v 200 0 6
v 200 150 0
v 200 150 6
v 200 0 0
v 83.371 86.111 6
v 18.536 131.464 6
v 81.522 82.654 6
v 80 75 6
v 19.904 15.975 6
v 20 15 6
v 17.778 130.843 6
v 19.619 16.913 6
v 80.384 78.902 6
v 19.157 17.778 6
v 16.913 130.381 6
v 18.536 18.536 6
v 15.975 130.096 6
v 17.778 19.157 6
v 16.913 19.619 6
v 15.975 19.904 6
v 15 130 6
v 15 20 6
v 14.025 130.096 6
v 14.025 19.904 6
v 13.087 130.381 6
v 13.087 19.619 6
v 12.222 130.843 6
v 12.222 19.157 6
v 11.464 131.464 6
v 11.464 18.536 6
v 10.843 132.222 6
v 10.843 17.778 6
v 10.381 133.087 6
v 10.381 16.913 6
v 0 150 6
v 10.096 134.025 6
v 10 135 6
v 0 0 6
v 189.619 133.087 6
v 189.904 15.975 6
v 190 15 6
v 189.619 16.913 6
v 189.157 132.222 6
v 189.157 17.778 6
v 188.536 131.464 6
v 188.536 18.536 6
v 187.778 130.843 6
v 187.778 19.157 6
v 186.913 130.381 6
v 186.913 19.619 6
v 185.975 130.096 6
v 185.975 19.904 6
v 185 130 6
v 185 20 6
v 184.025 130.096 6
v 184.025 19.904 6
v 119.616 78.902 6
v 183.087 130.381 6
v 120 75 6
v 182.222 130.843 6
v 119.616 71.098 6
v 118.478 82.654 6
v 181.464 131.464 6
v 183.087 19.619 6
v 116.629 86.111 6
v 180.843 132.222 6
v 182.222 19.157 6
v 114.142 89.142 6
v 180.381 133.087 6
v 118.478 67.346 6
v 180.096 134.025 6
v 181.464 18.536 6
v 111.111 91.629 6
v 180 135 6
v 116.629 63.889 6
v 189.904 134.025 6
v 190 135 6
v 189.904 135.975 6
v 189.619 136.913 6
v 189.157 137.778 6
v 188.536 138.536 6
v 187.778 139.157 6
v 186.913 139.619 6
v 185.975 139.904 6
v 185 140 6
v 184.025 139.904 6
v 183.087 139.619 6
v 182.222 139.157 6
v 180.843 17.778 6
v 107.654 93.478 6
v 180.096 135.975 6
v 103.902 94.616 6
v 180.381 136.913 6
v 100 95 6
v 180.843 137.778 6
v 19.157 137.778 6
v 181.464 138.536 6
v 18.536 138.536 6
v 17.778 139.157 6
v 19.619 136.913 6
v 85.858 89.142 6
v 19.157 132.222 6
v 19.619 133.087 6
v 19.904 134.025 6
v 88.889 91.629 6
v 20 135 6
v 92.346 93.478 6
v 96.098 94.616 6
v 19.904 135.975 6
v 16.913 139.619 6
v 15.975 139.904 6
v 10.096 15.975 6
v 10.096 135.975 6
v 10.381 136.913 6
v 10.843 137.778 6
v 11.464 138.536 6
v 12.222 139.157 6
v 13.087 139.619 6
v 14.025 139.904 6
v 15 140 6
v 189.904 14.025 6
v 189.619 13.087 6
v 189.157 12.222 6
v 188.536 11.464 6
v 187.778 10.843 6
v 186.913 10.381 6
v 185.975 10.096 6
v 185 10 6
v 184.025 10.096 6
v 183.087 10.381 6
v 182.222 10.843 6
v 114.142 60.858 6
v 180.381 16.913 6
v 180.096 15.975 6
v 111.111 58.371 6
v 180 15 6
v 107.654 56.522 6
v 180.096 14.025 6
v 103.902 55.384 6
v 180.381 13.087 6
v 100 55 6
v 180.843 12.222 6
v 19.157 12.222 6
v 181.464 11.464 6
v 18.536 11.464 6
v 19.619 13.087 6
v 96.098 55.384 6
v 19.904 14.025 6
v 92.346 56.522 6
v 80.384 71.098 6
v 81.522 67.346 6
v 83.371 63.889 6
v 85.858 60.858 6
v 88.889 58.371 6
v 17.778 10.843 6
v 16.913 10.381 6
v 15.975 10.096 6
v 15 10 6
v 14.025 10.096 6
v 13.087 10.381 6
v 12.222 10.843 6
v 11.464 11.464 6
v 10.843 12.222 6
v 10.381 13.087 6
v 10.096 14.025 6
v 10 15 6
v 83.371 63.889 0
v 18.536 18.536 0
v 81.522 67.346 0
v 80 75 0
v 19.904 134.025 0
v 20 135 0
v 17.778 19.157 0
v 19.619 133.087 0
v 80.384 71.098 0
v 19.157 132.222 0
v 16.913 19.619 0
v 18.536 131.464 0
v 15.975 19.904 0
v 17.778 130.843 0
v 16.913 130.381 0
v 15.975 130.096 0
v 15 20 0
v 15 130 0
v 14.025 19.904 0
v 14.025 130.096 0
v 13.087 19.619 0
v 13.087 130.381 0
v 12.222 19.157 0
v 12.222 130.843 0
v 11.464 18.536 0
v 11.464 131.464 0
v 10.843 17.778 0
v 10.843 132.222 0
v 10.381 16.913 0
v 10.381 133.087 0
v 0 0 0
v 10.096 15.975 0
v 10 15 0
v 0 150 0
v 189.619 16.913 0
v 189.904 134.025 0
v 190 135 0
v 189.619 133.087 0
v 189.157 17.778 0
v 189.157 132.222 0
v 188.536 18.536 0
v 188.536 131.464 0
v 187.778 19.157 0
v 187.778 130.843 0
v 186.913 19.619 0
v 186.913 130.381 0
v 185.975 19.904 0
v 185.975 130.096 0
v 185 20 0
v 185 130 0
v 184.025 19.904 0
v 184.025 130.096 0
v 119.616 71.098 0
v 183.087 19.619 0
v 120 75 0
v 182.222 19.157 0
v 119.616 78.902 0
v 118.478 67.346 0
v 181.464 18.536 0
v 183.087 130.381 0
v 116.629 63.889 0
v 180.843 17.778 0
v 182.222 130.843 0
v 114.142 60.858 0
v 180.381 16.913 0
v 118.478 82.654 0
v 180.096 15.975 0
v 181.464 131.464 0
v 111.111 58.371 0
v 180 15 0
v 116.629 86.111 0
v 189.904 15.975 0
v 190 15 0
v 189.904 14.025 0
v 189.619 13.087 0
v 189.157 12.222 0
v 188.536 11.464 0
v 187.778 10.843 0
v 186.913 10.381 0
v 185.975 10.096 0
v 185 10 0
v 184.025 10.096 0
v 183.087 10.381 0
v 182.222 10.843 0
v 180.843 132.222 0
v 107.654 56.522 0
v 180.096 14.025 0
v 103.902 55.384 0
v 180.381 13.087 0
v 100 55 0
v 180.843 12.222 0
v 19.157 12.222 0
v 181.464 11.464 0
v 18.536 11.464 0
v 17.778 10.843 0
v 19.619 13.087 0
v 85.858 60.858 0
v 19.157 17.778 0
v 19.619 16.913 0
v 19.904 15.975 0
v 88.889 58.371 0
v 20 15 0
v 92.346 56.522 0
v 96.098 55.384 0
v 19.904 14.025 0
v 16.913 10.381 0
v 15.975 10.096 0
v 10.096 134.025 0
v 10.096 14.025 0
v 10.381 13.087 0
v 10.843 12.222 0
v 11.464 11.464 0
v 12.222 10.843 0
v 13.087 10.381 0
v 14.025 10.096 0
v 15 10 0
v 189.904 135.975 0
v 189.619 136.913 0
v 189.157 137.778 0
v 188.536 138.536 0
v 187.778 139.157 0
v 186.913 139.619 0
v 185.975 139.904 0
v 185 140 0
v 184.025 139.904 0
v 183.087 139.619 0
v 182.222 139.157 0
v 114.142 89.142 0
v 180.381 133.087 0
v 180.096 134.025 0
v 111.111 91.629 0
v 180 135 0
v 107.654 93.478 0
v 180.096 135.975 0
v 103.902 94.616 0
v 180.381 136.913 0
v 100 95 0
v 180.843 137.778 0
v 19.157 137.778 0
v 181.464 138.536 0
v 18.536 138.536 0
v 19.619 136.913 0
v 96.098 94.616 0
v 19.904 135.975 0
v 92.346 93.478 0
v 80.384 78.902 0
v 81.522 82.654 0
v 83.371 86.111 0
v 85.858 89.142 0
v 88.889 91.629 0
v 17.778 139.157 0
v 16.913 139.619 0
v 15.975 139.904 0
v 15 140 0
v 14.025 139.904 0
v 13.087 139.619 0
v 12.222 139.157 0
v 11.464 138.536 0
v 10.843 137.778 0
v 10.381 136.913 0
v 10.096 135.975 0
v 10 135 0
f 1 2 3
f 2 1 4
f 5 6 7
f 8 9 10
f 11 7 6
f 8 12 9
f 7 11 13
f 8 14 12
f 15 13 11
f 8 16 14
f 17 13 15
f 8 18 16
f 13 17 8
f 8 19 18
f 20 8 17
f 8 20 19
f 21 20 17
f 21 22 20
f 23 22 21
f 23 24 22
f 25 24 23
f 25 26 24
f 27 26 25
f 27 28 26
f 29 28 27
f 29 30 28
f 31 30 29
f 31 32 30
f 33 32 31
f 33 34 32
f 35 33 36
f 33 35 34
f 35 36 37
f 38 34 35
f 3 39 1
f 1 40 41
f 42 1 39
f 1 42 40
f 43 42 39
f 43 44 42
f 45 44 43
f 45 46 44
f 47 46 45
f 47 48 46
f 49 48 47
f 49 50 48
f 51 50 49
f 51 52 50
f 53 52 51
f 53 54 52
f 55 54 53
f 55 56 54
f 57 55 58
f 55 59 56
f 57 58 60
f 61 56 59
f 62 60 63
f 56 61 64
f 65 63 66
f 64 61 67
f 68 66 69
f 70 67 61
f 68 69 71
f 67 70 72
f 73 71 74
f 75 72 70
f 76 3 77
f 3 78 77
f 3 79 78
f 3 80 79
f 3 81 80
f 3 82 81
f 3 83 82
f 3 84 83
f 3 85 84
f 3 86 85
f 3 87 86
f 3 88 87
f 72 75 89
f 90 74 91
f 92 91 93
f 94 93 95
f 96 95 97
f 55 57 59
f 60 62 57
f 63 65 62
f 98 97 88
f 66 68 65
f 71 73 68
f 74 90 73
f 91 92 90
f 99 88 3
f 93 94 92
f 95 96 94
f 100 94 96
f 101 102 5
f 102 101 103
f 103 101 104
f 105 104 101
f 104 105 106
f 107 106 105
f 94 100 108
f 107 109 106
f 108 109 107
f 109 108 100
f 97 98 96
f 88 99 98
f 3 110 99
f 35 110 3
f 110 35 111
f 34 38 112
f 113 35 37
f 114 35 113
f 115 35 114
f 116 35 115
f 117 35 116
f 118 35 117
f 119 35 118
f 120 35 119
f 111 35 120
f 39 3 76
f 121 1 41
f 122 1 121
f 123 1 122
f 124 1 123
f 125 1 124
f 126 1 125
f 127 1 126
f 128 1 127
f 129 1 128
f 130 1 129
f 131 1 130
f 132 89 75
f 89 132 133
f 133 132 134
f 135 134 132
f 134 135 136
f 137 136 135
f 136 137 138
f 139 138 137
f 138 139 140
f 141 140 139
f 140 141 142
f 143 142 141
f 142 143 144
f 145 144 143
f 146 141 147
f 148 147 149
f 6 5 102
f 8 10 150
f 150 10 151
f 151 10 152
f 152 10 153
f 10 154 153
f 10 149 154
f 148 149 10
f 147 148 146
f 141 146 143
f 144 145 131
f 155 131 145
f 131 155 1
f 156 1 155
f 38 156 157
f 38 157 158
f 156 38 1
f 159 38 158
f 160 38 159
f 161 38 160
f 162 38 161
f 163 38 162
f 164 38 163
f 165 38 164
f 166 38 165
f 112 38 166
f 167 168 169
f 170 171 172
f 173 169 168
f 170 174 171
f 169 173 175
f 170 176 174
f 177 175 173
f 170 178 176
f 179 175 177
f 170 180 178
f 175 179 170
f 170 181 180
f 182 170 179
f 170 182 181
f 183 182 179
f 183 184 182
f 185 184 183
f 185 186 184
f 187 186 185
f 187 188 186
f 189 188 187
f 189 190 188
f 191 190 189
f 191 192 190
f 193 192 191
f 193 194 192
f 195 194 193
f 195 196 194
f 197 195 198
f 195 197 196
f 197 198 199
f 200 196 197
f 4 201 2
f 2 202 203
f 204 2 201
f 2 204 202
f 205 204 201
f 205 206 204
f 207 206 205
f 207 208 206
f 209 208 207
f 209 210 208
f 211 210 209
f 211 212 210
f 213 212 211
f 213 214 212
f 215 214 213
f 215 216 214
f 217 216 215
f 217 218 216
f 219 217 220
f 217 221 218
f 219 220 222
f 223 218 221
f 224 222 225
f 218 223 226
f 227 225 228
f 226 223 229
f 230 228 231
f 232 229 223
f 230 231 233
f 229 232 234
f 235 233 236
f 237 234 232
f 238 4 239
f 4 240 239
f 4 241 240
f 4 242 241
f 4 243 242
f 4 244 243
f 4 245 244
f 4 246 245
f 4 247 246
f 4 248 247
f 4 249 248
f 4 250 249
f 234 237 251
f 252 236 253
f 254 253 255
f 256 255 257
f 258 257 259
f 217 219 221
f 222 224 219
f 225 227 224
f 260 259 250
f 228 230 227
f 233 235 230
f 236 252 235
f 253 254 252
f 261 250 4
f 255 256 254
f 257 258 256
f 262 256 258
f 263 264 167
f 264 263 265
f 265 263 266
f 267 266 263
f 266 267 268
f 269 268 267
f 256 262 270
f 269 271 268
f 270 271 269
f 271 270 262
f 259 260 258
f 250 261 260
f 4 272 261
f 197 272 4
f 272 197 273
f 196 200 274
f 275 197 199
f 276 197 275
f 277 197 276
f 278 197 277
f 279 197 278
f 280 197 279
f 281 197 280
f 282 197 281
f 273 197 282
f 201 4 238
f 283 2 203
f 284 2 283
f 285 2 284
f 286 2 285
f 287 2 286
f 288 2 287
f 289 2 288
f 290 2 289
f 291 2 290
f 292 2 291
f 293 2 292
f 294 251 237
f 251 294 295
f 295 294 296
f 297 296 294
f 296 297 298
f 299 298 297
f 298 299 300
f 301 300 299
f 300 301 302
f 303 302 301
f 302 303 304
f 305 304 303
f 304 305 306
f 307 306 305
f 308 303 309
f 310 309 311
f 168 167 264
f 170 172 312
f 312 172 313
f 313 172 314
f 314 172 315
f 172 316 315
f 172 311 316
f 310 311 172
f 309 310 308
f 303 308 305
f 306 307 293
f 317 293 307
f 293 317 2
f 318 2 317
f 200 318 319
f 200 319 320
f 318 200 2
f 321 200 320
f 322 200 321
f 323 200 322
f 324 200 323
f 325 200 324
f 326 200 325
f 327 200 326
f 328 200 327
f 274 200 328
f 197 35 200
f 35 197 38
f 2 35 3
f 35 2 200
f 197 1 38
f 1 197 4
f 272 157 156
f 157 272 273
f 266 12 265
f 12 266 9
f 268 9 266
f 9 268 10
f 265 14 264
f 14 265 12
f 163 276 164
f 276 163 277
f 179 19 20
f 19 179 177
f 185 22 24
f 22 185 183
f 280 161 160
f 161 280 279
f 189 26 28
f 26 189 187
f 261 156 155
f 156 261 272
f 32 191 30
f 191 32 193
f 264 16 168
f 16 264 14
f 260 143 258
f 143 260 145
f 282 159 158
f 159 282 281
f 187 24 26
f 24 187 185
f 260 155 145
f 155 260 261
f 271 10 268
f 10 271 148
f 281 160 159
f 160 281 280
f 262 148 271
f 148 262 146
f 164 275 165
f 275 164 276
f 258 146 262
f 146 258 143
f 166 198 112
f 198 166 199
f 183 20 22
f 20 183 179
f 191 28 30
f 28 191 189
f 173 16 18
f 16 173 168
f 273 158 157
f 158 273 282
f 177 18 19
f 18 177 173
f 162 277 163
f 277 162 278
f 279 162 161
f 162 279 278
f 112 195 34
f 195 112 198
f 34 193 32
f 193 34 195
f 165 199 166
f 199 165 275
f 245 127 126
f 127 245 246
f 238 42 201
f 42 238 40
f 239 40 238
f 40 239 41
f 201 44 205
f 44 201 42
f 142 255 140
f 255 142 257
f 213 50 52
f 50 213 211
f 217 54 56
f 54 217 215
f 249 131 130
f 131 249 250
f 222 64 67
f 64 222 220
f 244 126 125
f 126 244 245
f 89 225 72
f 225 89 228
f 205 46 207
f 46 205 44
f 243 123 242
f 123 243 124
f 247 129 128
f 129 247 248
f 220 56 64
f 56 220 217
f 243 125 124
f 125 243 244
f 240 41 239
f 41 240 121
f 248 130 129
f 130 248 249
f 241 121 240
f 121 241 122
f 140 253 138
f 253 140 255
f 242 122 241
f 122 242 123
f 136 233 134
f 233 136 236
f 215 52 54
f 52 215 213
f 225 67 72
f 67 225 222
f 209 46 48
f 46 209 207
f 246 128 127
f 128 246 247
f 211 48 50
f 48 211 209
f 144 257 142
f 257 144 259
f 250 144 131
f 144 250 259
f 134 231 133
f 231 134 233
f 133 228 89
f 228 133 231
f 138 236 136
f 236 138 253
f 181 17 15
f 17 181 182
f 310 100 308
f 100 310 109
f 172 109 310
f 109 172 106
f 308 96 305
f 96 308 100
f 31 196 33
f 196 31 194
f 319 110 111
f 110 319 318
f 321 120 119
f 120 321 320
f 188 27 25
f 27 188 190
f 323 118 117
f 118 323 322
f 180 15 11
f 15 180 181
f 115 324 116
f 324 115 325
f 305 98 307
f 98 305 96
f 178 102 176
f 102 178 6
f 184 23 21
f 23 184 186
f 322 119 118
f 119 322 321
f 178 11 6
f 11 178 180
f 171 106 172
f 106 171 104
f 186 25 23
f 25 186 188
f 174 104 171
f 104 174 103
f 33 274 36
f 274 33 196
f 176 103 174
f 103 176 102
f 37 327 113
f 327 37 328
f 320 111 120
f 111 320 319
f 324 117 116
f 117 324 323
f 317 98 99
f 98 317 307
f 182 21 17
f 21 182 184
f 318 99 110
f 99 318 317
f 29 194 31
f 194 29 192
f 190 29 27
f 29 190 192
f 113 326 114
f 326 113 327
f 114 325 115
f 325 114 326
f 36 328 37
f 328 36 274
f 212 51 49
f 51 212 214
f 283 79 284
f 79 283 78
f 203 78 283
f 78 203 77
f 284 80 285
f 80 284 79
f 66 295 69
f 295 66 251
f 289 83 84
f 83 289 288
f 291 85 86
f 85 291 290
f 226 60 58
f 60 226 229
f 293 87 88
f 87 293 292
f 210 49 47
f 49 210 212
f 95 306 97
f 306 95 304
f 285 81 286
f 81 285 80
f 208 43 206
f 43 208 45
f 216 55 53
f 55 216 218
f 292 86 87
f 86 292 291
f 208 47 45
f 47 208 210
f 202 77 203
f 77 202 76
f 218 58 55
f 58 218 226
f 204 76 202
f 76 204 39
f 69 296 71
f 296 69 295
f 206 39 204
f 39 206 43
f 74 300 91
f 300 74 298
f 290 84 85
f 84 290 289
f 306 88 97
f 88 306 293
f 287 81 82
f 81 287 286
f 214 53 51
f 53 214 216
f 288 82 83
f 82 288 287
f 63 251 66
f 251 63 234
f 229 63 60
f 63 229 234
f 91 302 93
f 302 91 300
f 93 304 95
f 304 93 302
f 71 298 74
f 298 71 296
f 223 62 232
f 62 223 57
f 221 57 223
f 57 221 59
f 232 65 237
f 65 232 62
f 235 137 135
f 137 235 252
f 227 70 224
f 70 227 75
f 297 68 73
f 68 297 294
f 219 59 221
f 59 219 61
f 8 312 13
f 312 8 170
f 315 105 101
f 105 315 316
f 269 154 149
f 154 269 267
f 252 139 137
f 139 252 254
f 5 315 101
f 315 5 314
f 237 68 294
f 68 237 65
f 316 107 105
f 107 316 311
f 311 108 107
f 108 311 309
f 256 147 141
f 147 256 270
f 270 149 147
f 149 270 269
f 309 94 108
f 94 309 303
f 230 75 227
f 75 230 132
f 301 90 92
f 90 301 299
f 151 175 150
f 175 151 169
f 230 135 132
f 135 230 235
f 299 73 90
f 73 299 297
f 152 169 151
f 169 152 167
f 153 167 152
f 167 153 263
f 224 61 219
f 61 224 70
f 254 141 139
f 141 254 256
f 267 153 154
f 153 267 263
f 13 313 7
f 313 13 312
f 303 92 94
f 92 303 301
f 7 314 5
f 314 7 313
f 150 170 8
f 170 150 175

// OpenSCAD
$fn = 32;

// ----------------------------------------------------------------------
// Big plate: 200-250 mm adapter plate
// ----------------------------------------------------------------------

// --- parameters (mm) ---
plate_l = 200;            // plate length, X
plate_w = 150;            // plate width, Y
plate_t = 6;              // plate thickness, Z
corner_d = 10;            // corner hole diameter
corner_in = 15;           // corner hole inset from the edges
bore_d = 40;              // central bore

difference() {
  cube([plate_l, plate_w, plate_t]);
  translate([corner_in, corner_in, -1]) cylinder(h = plate_t + 2, d = corner_d);
  translate([plate_l - corner_in, corner_in, -1]) cylinder(h = plate_t + 2, d = corner_d);
  translate([corner_in, plate_w - corner_in, -1]) cylinder(h = plate_t + 2, d = corner_d);
  translate([plate_l - corner_in, plate_w - corner_in, -1]) cylinder(h = plate_t + 2, d = corner_d);
  translate([plate_l / 2, plate_w / 2, -1]) cylinder(h = plate_t + 2, d = bore_d);
}
